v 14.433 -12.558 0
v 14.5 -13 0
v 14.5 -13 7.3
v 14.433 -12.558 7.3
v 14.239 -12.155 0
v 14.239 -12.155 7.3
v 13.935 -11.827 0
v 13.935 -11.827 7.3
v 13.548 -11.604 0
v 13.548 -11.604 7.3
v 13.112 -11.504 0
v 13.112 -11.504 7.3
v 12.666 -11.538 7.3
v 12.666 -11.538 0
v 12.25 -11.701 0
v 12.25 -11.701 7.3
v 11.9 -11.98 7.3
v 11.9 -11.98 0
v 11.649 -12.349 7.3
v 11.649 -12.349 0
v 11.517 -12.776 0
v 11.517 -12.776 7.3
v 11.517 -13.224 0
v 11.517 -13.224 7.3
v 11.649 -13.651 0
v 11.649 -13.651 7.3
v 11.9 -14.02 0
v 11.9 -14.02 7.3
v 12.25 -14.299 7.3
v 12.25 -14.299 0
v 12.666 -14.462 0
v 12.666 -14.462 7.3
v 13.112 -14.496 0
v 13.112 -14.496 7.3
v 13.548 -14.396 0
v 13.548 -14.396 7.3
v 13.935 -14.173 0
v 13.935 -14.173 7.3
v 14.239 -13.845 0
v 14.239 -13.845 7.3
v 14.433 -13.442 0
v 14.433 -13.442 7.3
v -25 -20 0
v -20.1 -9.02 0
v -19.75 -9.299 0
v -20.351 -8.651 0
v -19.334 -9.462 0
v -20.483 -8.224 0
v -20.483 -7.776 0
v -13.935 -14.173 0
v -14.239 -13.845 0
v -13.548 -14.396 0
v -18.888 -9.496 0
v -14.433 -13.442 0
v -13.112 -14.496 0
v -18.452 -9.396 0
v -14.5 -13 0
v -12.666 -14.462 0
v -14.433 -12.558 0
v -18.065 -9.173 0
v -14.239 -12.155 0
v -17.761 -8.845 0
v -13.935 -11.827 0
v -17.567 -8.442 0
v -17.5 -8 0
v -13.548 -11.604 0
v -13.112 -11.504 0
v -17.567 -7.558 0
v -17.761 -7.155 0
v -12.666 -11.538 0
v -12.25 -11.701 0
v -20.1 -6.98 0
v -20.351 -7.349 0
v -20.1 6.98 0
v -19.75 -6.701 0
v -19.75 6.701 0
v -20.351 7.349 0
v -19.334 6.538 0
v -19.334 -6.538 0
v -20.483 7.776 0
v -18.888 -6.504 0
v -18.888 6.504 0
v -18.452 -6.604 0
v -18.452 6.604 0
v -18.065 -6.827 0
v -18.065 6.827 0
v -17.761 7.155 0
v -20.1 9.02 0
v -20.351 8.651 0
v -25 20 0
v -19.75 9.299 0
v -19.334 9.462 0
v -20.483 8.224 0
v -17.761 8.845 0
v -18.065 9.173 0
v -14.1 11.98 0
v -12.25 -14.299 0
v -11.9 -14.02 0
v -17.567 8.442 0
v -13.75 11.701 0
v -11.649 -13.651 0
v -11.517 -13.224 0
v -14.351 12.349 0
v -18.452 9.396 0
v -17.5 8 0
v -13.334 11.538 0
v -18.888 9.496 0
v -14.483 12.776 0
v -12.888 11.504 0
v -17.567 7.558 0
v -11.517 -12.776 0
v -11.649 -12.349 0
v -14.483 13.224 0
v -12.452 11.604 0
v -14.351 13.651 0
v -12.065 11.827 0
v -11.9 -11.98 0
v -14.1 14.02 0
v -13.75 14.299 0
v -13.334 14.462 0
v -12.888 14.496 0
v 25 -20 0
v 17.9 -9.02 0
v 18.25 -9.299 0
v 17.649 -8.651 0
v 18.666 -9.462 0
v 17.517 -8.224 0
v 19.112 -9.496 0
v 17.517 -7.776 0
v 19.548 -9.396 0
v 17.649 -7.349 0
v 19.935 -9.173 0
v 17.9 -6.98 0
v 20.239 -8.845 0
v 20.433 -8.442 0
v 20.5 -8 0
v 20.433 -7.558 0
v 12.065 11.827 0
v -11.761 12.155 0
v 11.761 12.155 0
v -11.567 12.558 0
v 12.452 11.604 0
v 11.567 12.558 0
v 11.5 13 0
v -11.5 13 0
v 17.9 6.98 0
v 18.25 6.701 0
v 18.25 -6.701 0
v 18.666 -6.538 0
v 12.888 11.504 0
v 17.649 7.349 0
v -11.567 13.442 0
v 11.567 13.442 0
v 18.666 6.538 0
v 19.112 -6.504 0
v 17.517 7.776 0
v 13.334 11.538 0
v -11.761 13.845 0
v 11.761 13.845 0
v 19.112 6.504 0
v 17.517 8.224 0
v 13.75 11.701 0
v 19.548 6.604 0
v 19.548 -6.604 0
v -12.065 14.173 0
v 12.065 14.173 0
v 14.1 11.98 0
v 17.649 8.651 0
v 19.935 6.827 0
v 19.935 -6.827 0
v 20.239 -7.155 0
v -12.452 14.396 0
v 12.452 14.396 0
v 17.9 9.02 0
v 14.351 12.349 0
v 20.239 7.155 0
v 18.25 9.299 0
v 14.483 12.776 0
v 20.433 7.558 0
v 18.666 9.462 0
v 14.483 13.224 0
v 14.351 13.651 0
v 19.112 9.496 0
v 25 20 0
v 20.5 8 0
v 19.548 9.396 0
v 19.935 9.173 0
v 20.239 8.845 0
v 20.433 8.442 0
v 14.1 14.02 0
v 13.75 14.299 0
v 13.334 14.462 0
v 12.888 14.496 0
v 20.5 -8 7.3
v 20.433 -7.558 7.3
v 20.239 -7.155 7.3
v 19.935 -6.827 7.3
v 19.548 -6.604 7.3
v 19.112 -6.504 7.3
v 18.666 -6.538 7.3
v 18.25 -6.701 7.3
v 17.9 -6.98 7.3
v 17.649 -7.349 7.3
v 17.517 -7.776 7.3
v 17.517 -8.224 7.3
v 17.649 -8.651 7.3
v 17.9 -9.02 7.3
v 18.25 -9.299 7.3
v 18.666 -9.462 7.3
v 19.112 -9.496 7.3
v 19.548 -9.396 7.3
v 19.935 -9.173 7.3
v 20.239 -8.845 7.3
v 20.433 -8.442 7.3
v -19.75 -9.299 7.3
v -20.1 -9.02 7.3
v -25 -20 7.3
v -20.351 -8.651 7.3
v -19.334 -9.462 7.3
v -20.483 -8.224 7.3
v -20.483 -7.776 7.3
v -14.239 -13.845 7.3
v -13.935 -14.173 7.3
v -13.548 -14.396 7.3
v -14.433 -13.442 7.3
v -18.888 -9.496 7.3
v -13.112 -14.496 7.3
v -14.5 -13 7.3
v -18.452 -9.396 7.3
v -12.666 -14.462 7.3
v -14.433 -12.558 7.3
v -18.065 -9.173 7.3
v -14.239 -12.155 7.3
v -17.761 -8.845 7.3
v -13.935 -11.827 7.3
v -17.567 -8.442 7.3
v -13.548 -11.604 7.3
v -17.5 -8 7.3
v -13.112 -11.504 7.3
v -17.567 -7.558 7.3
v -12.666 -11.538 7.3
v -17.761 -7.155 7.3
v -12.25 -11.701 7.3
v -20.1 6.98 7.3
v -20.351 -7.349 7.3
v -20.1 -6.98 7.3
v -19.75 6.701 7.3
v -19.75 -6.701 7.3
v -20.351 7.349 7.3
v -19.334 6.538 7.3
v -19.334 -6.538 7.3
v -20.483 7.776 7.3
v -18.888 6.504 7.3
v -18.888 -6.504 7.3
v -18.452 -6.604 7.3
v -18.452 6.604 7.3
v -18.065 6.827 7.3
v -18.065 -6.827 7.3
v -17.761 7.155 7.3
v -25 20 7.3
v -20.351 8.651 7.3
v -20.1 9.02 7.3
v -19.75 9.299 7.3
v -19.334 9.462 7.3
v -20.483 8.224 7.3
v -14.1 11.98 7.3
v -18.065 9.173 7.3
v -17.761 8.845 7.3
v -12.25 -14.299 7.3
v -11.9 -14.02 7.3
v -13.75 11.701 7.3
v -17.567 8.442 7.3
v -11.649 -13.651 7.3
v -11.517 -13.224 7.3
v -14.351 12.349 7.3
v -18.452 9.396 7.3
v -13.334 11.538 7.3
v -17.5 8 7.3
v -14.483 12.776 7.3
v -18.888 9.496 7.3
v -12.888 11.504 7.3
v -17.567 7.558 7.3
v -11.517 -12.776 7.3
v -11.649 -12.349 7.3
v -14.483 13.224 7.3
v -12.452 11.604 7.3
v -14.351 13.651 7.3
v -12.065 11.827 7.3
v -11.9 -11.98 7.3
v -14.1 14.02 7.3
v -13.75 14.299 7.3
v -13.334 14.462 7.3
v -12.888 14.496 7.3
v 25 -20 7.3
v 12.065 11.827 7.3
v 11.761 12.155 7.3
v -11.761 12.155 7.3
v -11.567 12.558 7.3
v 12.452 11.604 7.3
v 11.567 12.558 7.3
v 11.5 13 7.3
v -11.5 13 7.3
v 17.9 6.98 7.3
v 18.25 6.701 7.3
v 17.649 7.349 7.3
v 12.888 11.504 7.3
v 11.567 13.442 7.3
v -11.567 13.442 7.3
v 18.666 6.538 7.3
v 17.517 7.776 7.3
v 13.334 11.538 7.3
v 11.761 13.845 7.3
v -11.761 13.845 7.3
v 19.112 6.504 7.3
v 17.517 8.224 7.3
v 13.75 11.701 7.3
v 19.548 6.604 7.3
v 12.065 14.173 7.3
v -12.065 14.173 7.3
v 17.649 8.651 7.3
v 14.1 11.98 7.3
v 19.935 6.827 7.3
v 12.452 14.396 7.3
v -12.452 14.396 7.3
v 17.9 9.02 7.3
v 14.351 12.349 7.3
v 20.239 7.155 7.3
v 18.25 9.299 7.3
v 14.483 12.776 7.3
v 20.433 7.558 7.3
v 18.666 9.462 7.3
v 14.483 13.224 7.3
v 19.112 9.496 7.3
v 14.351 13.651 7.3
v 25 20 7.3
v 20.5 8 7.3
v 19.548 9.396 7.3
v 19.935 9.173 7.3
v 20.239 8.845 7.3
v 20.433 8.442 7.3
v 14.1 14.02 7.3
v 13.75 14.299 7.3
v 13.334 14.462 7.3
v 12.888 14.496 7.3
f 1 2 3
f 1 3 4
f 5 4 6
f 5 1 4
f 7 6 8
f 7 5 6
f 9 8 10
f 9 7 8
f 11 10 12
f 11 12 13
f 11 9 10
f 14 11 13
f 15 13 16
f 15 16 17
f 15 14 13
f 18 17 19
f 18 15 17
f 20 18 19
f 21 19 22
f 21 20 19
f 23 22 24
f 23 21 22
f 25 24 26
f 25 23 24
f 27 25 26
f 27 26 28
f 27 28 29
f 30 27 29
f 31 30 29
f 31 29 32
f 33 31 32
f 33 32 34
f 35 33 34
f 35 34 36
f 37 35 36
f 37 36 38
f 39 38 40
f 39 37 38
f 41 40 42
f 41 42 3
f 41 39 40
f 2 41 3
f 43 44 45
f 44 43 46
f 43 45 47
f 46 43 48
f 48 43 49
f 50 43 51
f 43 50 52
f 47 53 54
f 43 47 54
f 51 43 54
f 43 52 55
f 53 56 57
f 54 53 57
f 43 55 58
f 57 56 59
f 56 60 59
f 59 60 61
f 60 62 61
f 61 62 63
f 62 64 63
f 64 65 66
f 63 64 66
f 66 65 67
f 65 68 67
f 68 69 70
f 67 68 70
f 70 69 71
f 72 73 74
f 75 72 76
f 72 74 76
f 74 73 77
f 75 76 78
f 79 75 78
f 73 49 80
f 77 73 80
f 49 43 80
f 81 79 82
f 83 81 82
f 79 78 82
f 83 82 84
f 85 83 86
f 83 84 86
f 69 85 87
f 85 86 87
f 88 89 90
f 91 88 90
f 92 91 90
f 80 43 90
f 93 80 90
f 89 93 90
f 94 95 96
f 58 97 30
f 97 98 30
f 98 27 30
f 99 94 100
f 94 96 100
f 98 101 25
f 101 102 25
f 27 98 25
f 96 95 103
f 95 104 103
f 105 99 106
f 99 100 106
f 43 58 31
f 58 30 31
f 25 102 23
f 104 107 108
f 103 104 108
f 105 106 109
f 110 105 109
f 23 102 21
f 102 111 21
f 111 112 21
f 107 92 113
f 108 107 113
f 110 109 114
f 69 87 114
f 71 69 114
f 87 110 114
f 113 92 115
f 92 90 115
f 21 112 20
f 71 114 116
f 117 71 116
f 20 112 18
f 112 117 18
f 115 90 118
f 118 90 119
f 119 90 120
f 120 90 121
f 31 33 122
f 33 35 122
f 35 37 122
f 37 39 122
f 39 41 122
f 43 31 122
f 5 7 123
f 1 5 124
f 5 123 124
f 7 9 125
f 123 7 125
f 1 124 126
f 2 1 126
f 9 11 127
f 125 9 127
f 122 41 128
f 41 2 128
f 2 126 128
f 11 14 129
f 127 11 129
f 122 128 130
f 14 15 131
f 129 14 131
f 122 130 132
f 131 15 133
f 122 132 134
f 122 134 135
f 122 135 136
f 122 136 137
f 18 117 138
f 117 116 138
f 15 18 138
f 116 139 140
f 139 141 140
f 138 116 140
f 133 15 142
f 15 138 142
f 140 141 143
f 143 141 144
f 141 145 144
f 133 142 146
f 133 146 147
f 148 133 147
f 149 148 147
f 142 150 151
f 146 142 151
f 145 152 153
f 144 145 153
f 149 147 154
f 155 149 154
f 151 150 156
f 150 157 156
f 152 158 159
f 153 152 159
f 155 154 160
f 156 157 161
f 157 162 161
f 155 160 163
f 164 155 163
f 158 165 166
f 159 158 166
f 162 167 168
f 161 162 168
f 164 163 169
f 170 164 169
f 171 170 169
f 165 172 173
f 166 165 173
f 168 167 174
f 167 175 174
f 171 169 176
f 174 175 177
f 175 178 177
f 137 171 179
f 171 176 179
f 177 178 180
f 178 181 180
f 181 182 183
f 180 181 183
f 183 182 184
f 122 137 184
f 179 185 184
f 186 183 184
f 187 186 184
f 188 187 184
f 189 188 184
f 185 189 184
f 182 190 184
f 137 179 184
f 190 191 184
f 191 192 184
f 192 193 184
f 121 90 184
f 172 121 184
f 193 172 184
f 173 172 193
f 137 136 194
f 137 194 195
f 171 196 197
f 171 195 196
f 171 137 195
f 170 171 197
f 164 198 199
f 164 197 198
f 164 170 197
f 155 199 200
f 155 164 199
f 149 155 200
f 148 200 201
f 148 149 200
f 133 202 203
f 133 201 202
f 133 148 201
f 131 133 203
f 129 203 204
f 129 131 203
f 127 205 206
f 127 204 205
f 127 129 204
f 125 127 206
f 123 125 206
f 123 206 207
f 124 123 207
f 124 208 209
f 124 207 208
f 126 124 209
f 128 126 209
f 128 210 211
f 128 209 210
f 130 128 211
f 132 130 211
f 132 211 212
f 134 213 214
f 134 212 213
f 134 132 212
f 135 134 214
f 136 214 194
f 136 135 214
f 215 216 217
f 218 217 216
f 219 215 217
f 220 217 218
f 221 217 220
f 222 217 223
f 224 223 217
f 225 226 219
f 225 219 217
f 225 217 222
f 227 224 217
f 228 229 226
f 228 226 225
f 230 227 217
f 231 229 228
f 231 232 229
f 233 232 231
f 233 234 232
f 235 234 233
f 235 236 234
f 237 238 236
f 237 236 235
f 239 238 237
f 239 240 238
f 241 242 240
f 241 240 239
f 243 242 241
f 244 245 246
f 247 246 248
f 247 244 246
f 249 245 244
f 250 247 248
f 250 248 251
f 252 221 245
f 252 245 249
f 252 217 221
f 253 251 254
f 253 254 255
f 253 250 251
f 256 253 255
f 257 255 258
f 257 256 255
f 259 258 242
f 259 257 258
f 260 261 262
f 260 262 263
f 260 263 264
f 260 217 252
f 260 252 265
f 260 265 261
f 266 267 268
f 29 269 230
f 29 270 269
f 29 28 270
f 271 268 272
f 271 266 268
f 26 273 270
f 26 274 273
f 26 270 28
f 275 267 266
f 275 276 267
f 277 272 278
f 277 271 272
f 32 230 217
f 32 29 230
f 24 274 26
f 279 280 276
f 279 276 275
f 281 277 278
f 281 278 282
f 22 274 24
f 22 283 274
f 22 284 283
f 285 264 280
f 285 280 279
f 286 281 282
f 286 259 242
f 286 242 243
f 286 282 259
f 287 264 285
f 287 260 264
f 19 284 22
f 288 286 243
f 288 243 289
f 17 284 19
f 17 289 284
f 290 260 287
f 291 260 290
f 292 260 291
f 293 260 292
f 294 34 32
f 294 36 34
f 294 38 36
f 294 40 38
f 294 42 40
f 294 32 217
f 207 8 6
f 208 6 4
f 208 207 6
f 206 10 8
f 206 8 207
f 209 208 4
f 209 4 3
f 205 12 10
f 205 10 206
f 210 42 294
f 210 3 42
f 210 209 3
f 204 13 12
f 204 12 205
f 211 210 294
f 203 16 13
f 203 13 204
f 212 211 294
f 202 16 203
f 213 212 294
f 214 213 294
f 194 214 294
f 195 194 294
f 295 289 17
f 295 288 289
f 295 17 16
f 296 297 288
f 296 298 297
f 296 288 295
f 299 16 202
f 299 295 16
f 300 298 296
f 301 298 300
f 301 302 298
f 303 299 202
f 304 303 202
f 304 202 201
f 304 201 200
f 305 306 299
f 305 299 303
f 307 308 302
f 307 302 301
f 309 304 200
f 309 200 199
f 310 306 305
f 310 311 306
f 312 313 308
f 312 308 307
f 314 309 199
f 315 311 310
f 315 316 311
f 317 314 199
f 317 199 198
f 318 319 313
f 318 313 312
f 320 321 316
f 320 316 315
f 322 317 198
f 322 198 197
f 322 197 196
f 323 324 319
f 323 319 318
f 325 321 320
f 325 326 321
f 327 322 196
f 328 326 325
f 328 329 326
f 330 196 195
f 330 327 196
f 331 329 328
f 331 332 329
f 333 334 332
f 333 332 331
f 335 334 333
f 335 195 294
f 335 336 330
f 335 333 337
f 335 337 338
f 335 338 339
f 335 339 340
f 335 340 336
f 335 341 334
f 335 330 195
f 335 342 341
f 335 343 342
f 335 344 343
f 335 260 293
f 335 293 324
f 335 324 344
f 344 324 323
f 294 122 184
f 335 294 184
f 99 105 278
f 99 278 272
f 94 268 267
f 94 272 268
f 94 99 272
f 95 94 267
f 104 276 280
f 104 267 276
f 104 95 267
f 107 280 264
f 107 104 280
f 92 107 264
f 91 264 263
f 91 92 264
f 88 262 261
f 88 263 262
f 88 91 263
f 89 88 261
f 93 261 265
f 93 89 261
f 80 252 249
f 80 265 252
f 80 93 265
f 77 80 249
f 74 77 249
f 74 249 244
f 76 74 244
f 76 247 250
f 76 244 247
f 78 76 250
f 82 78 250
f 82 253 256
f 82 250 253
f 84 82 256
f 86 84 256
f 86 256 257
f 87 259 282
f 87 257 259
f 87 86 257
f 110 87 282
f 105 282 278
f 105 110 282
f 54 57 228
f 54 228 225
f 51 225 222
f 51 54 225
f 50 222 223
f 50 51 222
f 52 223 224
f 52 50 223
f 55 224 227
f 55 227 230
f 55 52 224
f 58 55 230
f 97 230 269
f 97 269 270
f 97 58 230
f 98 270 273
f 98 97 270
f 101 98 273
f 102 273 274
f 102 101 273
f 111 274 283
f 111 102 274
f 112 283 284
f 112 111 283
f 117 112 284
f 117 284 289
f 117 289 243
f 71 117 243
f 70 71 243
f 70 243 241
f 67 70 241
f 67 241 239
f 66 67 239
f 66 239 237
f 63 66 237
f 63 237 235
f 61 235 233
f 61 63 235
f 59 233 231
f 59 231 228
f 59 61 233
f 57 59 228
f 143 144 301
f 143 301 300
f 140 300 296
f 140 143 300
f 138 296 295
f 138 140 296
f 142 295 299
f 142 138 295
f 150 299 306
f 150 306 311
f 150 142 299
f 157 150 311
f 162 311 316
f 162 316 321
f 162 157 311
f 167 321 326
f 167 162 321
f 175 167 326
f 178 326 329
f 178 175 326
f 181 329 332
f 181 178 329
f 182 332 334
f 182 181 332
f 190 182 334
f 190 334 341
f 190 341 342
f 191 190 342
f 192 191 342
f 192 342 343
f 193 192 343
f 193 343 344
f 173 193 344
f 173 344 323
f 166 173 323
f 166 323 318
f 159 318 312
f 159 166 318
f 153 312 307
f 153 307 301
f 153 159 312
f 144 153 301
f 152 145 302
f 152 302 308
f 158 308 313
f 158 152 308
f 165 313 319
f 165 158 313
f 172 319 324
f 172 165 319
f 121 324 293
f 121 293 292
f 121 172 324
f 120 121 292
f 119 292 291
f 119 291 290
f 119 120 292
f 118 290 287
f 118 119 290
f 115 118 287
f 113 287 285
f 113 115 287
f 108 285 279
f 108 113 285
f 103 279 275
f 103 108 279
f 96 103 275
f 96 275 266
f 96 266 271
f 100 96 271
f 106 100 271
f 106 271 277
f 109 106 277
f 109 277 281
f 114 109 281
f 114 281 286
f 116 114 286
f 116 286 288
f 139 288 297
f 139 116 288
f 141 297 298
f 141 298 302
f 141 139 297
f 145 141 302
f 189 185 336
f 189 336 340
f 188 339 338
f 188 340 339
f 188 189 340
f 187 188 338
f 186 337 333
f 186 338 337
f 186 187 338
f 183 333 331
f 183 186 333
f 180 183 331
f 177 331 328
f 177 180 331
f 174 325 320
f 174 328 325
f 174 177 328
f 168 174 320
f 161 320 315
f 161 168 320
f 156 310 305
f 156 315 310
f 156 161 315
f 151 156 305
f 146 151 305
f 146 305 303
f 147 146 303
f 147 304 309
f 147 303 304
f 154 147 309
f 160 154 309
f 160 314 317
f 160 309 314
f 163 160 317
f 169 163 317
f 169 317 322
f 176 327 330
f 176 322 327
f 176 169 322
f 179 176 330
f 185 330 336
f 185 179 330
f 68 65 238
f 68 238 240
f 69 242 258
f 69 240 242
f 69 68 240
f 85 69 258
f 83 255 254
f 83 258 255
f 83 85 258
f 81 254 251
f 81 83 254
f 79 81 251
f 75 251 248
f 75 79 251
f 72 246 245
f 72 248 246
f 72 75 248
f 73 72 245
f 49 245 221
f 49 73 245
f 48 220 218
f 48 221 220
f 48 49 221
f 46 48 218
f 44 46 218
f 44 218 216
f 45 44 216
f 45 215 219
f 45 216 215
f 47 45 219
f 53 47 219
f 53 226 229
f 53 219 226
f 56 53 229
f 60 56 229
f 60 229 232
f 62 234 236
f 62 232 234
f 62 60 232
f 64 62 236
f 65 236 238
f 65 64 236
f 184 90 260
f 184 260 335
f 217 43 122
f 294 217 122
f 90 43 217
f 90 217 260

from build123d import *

# Parameters (mm, degrees)
SKETCH1_W               = 50
SKETCH1_H               = 40
SKETCH1_R               = 1.5
BOSS_EXTRUDE1_DEPTH     = 7.3
CUT_EXTRUDE1_DEPTH      = 33.837326322
CUT_EXTRUDE1_DEPTH_BACK = 33.837326322
SKETCH2_R               = 1.5


with BuildPart() as part:
    # Sketch1 → Boss-Extrude1 (new body)
    with BuildSketch(Plane.XY):
        Rectangle(SKETCH1_W, SKETCH1_H)
        with Locations((-13, 13)):
            Circle(SKETCH1_R, mode=Mode.SUBTRACT)
        with Locations(Location((13, 13, 0), (0, 0, 180))):
            Circle(SKETCH1_R, mode=Mode.SUBTRACT)
        with Locations((13, -13)):
            Circle(SKETCH1_R, mode=Mode.SUBTRACT)
        with Locations(Location((-13, -13, 0), (0, 0, 180))):
            Circle(SKETCH1_R, mode=Mode.SUBTRACT)
    extrude(amount=BOSS_EXTRUDE1_DEPTH)

    # Sketch2 → Cut-Extrude1 (cut, two sides: drawn at the far end of the back side and taken through both)
    with BuildSketch(Plane.XY.offset(7.3).offset(-CUT_EXTRUDE1_DEPTH_BACK)):
        with Locations((-19, 8)):
            Circle(SKETCH2_R)
        with Locations((19, 8)):
            Circle(SKETCH2_R)
        with Locations((19, -8)):
            Circle(SKETCH2_R)
        with Locations((-19, -8)):
            Circle(SKETCH2_R)
    extrude(amount=CUT_EXTRUDE1_DEPTH + CUT_EXTRUDE1_DEPTH_BACK, mode=Mode.SUBTRACT)


solid = part.part
